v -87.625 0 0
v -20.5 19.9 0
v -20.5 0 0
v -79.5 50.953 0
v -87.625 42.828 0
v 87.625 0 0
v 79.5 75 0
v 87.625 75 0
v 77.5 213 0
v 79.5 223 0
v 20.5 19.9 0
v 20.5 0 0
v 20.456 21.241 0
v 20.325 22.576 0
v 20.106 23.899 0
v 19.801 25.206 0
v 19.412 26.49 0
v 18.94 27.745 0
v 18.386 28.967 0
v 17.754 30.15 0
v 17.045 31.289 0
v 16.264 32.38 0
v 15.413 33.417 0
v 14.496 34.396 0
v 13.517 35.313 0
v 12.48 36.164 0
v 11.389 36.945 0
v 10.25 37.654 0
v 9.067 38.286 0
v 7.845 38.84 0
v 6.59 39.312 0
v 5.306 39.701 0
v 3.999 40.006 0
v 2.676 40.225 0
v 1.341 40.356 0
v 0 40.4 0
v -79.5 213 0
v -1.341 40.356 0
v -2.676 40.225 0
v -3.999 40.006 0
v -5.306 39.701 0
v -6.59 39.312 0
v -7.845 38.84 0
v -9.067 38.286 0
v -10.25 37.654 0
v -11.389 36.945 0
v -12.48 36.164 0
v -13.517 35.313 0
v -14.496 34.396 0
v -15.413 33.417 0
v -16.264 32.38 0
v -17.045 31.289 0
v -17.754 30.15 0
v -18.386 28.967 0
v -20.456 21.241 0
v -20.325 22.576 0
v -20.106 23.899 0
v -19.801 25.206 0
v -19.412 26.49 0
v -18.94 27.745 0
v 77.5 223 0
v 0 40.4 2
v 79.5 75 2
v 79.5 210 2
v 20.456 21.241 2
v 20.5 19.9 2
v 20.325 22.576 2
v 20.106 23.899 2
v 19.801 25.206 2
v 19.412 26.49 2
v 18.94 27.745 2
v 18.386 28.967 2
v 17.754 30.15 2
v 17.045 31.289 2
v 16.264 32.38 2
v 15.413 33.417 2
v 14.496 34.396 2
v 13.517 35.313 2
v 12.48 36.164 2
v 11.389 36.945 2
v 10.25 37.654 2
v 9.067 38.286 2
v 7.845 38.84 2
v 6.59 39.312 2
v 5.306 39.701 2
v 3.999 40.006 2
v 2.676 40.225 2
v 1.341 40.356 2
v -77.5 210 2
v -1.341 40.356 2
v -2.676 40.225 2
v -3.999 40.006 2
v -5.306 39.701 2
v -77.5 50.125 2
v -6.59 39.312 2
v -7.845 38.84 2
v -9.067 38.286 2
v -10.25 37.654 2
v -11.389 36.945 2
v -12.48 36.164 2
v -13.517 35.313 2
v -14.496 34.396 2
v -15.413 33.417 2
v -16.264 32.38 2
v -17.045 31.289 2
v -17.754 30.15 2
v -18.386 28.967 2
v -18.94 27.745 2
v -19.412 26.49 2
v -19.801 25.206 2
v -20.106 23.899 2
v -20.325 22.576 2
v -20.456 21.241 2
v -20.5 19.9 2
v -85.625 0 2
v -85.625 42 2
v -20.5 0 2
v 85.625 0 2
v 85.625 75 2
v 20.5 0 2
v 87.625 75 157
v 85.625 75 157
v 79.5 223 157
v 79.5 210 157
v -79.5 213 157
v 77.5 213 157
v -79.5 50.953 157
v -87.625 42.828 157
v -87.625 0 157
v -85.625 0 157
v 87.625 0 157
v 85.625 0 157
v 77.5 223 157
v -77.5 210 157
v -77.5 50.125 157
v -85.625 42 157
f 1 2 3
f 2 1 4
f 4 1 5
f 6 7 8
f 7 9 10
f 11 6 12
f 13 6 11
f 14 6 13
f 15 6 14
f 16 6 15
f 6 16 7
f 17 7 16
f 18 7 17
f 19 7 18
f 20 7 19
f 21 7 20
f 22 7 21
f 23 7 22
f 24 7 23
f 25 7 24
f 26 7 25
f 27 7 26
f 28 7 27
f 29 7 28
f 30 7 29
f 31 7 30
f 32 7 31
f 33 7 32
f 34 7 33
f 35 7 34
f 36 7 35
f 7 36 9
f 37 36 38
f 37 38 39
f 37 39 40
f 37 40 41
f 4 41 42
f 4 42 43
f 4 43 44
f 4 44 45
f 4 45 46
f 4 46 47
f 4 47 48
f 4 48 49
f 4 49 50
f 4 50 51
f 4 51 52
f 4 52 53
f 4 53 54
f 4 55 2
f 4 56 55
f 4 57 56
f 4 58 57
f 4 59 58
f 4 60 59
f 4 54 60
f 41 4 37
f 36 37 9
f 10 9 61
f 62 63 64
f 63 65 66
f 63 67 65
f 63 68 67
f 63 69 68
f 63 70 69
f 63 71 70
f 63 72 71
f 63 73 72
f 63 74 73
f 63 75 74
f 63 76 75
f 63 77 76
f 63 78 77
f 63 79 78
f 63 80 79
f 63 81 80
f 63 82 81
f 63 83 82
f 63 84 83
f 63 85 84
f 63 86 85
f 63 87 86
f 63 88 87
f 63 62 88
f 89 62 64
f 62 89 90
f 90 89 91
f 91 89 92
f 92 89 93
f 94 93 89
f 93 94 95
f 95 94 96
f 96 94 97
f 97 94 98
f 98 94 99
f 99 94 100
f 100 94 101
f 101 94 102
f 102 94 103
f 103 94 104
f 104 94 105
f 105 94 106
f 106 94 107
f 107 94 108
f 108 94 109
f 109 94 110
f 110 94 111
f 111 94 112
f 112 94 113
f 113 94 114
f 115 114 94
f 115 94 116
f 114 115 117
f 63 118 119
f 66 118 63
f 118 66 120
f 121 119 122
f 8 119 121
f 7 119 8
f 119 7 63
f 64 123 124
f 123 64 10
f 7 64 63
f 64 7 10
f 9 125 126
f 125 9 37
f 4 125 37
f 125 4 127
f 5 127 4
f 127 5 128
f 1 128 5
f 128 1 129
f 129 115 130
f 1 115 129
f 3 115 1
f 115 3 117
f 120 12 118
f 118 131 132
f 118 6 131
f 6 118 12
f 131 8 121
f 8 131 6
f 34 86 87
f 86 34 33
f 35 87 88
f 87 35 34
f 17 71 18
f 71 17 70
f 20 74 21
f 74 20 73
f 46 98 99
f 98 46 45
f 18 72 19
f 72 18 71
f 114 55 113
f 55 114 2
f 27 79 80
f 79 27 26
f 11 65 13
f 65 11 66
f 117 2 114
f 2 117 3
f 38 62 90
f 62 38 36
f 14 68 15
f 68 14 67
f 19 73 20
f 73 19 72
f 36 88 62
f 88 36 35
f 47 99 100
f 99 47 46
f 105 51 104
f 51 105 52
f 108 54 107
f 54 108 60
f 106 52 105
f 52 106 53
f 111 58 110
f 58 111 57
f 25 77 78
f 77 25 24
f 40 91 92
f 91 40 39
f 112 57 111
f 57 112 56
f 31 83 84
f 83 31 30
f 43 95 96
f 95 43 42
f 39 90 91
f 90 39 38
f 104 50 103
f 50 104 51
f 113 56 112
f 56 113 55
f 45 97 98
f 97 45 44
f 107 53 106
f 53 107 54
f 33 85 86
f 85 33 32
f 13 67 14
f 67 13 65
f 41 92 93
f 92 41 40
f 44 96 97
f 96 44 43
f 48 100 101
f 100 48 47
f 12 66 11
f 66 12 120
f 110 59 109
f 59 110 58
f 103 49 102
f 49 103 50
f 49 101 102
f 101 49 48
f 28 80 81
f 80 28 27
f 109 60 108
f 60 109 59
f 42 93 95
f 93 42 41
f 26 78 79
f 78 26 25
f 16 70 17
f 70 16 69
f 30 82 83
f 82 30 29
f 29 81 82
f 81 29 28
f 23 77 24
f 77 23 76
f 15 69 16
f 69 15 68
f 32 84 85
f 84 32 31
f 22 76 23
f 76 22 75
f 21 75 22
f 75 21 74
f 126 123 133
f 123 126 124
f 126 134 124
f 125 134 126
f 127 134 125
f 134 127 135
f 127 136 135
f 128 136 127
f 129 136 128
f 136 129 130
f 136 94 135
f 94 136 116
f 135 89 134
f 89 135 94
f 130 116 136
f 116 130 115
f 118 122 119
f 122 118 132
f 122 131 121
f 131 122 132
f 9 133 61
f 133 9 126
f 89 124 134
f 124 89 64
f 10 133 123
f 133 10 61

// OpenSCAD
/*
 * Overlay shroud -- ORIGINAL OpenSCAD CANDIDATE for the user's already-printed
 * MakerWorld collector. Nothing is imported from the third-party model; only
 * the dimensions recorded in docs/overlay-fit.md are used.
 *
 * UNPRINTED CANDIDATE, NOT A PHYSICAL FIT. Cold, nonmetal dust only. Not
 * validated for sparks or metal dust. Airflow, hose fit, seal leakage and tool
 * clearance are untested. Intended for single-material PETG Translucent,
 * without the previous candidate's experimental PLA support interfaces.
 *
 * Select a part:  openscad -D 'part="print"' -o overlay-shroud.stl cad/overlay-shroud.scad
 *   print     the ONE printable solid, rotated rear-face-down on the bed (default)
 *   assembly  installed orientation (z=0 is the table), collector envelope as a
 *             `%` ghost. View only
 *   section   assembly cut at x=0 through the hose arch. View only
 *
 * ASSEMBLY FRAME (collector frame from docs/overlay-fit.md, z shifted to the
 * table): X width centred on the collector, Y depth (front opening toward -Y),
 * Z up, z=0 is the table AND the collector underside.
 *
 * HOW IT MOUNTS (the key decision):
 *  - It does NOT mount on the collector. The shroud is a free-standing tent
 *    that stands on the TABLE around the collector and is located only by
 *    friction/gravity. The collector's upper rim is non-level (sides 19.8,
 *    rear 39.8, rising corners, rounded exterior edge, 1.2 mm hollow cap).
 *    Nothing here touches, traces or loads that rim, and no lip enters the
 *    collector's tapered opening, so the suction slots stay uncovered.
 *  - Sealed interface = the flat bottom edges of the walls on the table
 *    (left, rear, right-low). A thin REMOVABLE compressible gasket tape on
 *    those edges is required but NOT modelled. The open underside is therefore
 *    closed by the table, not a third air opening. The 21.4 mm of front depth
 *    beyond the collector also uses the table as its floor, so no hidden
 *    bottom air gap exists.
 *  - Base pocket is 171.25 (front open) wide, 0.625 mm per side over the
 *    170 mm body. Above the collector it steps in on a 45 degree shoulder to
 *    the 155 mm clear width (>= the 151.2 mm collector opening).
 *  - Rear hose: the 39.8 mm stub (round top, flat base on the table, axis
 *    z=19.9) leaves the collector at Y 45..85 and MUST cross the rear wall.
 *    There is no way around that with the rear wall closed. Candidate: a
 *    closely fitted arch notch (41.0 wide, 0.6 mm per side) cut in the rear
 *    wall. It leaves a ~0.6 mm gap that is NOT sealed by geometry. EXTRA
 *    REQUIRED SEAL: wrap the stub with removable foam/EPDM tape (about 1.5 mm
 *    uncompressed) where it passes the arch and press the shroud onto it. A
 *    snug split seal would be a better revision. The inner face of the rear
 *    wall is at Y 48.6, which is past the stub blend (stub is a true 39.8 mm
 *    profile only from about Y 48).
 *  - Opposite-wall tool clearance was NOT investigated, by user directive.
 *
 * OPENINGS (only these, connected): the front plane (full height) and the
 * right face above z=75 up to the roof underside. Right wall below 75 stays
 * so the lower air is captured.
 *
 * PRINT: rear outer face on the bed. Every wall is then a plain extrusion
 * along the print Z axis, with no geometric overhangs; intended to print
 * without supports. The arch is a through-cut. This is not a print guarantee. Roof-down was rejected: the 75 mm right wall would start in
 * mid-air at its top edge and need a 160 mm unsupported bridge. Caveats: the
 * walls are 2 mm plates 160 mm tall and may wobble in the print; the 155 mm
 * roof is cantilevered from the left and rear walls, so a top-side rim along
 * the open right edge (printed, no support) stiffens it. Stiffness is
 * untested. The rim sits above the roof, outside the clear volume.
 *
 * Roof underside is 210 (>= 210 required, 200 highest hand), clear footprint
 * 155 x 155 above the shoulder, tool contact ~115 high / 125 behind the front
 * opening lies inside it.
 */

// ---------------------------------------------------------------- selector
part = "print"; // print | assembly | section

// ------------------------------------------------------ collector (from docs)
body_half_w = 85;     // collector body X -85..85
body_rear_y = 45;     // collector rear plane
rear_top = 39.8;      // highest collector point above the table
stub_r = 19.9;        // hose stub outer radius, axis z = stub_r, X = 0
stub_end_y = 85;      // hose mouth plane
stub_flat_y = 48;     // stub is a true cylinder/flat-base from about here

// ------------------------------------------------------- shroud dimensions
t = 2;                // wall thickness (left, rear, right)
roof_t = 3;           // roof plate
pocket_half_w = 85.625; // base pocket inner half width (171.25 total, 0.625/side)
clear_half_w = 77.5;  // inner half width above the shoulder (155 total)
clear_d = 155;        // clear depth, front opening to rear inner face
rear_in_y = 48.6;     // rear wall inner face (3.6 behind the body, past stub blend)
shoulder_z = 42;      // shoulder start: 2.2 above the highest collector point
side_open_z = 75;     // right wall top; the right opening starts here
roof_under_z = 210;   // roof underside
rim_h = 10;           // top-side stiffening rim on the open right roof edge
notch_clear = 0.6;    // hose arch clearance per side
$fn = 96;

// ---------------------------------------------------------------- derived
rear_out_y = rear_in_y + t;            // rear outer face, bed face when printed
front_y = rear_in_y - clear_d;         // front opening plane
roof_top_z = roof_under_z + roof_t;
out_half_w = pocket_half_w + t;        // outer half width of the base walls
up_out_half_w = clear_half_w + t;      // outer half width above the shoulder
shoulder_rise = pocket_half_w - clear_half_w; // 45 degree shoulder rise
// The outer shoulder line is the inner one offset t perpendicular.
out_z0 = shoulder_z - t + t * sqrt(2);               // outer line at the base wall
out_z1 = out_z0 + (out_half_w - up_out_half_w);      // outer line at the upper wall
notch_w = 2 * (stub_r + notch_clear);

assert(t >= 1.6 && t <= 3, "wall_t outside 1.6..3 mm");
assert(roof_t >= 2 && roof_t <= 4, "roof_t outside 2..4 mm");
assert(pocket_half_w * 2 >= 170 + 1, "pocket narrower than body plus clearance");
assert(clear_half_w * 2 == 155 && clear_d == 155, "clear footprint must stay 155 x 155");
assert(clear_half_w * 2 >= 151.2, "upper clear width below the collector opening");
assert(shoulder_z >= rear_top + 2, "shoulder must clear the highest collector point");
assert(rear_in_y >= stub_flat_y, "rear wall inside the stub blend zone");
assert(rear_in_y > body_rear_y, "rear wall inside the collector body");
assert(roof_under_z >= 210, "roof underside below 210");
assert(side_open_z > shoulder_z + shoulder_rise, "right opening starts below the shoulder");
assert(rear_out_y <= 256 && roof_top_z + rim_h <= 256, "exceeds the 256 mm bed");

// Extrude a 2D (x, z) profile along Y from y0 to y1.
module slab(y0, y1) {
    translate([0, y1, 0]) rotate([90, 0, 0]) linear_extrude(y1 - y0) children();
}

// Left wall: straight base pocket, 45 degree shoulder, straight upper wall.
module left_wall() {
    slab(front_y, rear_out_y)
        polygon([
            [-out_half_w, 0], [-out_half_w, out_z0], [-up_out_half_w, out_z1],
            [-up_out_half_w, roof_top_z], [-clear_half_w, roof_top_z],
            [-clear_half_w, shoulder_z + shoulder_rise],
            [-pocket_half_w, shoulder_z], [-pocket_half_w, 0]]);
}

// Right wall: low, straight, free top edge at side_open_z.
module right_wall() {
    slab(front_y, rear_in_y) // butts the rear wall inner face, no coplanar overlap
        translate([pocket_half_w, 0]) square([t, side_open_z]);
}

// Rear wall: full profile, closed except the hose arch.
module rear_wall() {
    difference() {
        slab(rear_in_y, rear_out_y)
            polygon([
                [-out_half_w, 0], [out_half_w, 0], [out_half_w, side_open_z],
                [up_out_half_w, side_open_z], [up_out_half_w, roof_top_z],
                [-up_out_half_w, roof_top_z], [-up_out_half_w, out_z1],
                [-out_half_w, out_z0]]);
        // Arch open to the table: flat sides up to the axis, round above.
        translate([0, rear_in_y - 1, 0]) rotate([-90, 0, 0])
            linear_extrude(t + 2) hose_arch();
    }
}

module hose_arch() {
    // 2D in (x, -z) after the rotate above, so mirror z here.
    mirror([0, 1]) union() {
        translate([-notch_w / 2, -1]) square([notch_w, stub_r + 1]);
        translate([0, stub_r]) circle(d = notch_w);
    }
}

// Roof plate plus the top-side stiffening rim on the open right edge.
module roof() {
    slab(front_y, rear_out_y) {
        translate([-up_out_half_w, roof_under_z]) square([2 * up_out_half_w, roof_t]);
        translate([clear_half_w, roof_top_z - 0.01]) square([t, rim_h + 0.01]);
    }
}

module shroud() {
    union() {
        left_wall();
        right_wall();
        rear_wall();
        roof();
    }
}

// Conservative collector envelope, view only (never exported).
module collector_ghost() {
    translate([-body_half_w, -85, 0]) cube([2 * body_half_w, body_rear_y + 85, rear_top]);
    translate([-stub_r, body_rear_y, 0])
        cube([2 * stub_r, stub_end_y - body_rear_y, stub_r]);
    translate([0, body_rear_y, stub_r]) rotate([-90, 0, 0])
        cylinder(r = stub_r, h = stub_end_y - body_rear_y);
}

// Rear face on the bed: x'=x, y'=z, z'=rear_out_y-y (a proper rotation).
module print_orient() {
    multmatrix([[1, 0, 0, 0], [0, 0, 1, 0], [0, -1, 0, rear_out_y], [0, 0, 0, 1]])
        children();
}

if (part == "print") {
    print_orient() shroud();
} else if (part == "assembly") {
    shroud();
    %collector_ghost();
} else if (part == "section") {
    difference() {
        shroud();
        translate([0, -300, -1]) cube([300, 600, 400]);
    }
    %intersection() {
        collector_ghost();
        translate([-300, -300, -1]) cube([300, 600, 400]);
    }
} else {
    assert(false, str("unknown part '", part, "'"));
}
